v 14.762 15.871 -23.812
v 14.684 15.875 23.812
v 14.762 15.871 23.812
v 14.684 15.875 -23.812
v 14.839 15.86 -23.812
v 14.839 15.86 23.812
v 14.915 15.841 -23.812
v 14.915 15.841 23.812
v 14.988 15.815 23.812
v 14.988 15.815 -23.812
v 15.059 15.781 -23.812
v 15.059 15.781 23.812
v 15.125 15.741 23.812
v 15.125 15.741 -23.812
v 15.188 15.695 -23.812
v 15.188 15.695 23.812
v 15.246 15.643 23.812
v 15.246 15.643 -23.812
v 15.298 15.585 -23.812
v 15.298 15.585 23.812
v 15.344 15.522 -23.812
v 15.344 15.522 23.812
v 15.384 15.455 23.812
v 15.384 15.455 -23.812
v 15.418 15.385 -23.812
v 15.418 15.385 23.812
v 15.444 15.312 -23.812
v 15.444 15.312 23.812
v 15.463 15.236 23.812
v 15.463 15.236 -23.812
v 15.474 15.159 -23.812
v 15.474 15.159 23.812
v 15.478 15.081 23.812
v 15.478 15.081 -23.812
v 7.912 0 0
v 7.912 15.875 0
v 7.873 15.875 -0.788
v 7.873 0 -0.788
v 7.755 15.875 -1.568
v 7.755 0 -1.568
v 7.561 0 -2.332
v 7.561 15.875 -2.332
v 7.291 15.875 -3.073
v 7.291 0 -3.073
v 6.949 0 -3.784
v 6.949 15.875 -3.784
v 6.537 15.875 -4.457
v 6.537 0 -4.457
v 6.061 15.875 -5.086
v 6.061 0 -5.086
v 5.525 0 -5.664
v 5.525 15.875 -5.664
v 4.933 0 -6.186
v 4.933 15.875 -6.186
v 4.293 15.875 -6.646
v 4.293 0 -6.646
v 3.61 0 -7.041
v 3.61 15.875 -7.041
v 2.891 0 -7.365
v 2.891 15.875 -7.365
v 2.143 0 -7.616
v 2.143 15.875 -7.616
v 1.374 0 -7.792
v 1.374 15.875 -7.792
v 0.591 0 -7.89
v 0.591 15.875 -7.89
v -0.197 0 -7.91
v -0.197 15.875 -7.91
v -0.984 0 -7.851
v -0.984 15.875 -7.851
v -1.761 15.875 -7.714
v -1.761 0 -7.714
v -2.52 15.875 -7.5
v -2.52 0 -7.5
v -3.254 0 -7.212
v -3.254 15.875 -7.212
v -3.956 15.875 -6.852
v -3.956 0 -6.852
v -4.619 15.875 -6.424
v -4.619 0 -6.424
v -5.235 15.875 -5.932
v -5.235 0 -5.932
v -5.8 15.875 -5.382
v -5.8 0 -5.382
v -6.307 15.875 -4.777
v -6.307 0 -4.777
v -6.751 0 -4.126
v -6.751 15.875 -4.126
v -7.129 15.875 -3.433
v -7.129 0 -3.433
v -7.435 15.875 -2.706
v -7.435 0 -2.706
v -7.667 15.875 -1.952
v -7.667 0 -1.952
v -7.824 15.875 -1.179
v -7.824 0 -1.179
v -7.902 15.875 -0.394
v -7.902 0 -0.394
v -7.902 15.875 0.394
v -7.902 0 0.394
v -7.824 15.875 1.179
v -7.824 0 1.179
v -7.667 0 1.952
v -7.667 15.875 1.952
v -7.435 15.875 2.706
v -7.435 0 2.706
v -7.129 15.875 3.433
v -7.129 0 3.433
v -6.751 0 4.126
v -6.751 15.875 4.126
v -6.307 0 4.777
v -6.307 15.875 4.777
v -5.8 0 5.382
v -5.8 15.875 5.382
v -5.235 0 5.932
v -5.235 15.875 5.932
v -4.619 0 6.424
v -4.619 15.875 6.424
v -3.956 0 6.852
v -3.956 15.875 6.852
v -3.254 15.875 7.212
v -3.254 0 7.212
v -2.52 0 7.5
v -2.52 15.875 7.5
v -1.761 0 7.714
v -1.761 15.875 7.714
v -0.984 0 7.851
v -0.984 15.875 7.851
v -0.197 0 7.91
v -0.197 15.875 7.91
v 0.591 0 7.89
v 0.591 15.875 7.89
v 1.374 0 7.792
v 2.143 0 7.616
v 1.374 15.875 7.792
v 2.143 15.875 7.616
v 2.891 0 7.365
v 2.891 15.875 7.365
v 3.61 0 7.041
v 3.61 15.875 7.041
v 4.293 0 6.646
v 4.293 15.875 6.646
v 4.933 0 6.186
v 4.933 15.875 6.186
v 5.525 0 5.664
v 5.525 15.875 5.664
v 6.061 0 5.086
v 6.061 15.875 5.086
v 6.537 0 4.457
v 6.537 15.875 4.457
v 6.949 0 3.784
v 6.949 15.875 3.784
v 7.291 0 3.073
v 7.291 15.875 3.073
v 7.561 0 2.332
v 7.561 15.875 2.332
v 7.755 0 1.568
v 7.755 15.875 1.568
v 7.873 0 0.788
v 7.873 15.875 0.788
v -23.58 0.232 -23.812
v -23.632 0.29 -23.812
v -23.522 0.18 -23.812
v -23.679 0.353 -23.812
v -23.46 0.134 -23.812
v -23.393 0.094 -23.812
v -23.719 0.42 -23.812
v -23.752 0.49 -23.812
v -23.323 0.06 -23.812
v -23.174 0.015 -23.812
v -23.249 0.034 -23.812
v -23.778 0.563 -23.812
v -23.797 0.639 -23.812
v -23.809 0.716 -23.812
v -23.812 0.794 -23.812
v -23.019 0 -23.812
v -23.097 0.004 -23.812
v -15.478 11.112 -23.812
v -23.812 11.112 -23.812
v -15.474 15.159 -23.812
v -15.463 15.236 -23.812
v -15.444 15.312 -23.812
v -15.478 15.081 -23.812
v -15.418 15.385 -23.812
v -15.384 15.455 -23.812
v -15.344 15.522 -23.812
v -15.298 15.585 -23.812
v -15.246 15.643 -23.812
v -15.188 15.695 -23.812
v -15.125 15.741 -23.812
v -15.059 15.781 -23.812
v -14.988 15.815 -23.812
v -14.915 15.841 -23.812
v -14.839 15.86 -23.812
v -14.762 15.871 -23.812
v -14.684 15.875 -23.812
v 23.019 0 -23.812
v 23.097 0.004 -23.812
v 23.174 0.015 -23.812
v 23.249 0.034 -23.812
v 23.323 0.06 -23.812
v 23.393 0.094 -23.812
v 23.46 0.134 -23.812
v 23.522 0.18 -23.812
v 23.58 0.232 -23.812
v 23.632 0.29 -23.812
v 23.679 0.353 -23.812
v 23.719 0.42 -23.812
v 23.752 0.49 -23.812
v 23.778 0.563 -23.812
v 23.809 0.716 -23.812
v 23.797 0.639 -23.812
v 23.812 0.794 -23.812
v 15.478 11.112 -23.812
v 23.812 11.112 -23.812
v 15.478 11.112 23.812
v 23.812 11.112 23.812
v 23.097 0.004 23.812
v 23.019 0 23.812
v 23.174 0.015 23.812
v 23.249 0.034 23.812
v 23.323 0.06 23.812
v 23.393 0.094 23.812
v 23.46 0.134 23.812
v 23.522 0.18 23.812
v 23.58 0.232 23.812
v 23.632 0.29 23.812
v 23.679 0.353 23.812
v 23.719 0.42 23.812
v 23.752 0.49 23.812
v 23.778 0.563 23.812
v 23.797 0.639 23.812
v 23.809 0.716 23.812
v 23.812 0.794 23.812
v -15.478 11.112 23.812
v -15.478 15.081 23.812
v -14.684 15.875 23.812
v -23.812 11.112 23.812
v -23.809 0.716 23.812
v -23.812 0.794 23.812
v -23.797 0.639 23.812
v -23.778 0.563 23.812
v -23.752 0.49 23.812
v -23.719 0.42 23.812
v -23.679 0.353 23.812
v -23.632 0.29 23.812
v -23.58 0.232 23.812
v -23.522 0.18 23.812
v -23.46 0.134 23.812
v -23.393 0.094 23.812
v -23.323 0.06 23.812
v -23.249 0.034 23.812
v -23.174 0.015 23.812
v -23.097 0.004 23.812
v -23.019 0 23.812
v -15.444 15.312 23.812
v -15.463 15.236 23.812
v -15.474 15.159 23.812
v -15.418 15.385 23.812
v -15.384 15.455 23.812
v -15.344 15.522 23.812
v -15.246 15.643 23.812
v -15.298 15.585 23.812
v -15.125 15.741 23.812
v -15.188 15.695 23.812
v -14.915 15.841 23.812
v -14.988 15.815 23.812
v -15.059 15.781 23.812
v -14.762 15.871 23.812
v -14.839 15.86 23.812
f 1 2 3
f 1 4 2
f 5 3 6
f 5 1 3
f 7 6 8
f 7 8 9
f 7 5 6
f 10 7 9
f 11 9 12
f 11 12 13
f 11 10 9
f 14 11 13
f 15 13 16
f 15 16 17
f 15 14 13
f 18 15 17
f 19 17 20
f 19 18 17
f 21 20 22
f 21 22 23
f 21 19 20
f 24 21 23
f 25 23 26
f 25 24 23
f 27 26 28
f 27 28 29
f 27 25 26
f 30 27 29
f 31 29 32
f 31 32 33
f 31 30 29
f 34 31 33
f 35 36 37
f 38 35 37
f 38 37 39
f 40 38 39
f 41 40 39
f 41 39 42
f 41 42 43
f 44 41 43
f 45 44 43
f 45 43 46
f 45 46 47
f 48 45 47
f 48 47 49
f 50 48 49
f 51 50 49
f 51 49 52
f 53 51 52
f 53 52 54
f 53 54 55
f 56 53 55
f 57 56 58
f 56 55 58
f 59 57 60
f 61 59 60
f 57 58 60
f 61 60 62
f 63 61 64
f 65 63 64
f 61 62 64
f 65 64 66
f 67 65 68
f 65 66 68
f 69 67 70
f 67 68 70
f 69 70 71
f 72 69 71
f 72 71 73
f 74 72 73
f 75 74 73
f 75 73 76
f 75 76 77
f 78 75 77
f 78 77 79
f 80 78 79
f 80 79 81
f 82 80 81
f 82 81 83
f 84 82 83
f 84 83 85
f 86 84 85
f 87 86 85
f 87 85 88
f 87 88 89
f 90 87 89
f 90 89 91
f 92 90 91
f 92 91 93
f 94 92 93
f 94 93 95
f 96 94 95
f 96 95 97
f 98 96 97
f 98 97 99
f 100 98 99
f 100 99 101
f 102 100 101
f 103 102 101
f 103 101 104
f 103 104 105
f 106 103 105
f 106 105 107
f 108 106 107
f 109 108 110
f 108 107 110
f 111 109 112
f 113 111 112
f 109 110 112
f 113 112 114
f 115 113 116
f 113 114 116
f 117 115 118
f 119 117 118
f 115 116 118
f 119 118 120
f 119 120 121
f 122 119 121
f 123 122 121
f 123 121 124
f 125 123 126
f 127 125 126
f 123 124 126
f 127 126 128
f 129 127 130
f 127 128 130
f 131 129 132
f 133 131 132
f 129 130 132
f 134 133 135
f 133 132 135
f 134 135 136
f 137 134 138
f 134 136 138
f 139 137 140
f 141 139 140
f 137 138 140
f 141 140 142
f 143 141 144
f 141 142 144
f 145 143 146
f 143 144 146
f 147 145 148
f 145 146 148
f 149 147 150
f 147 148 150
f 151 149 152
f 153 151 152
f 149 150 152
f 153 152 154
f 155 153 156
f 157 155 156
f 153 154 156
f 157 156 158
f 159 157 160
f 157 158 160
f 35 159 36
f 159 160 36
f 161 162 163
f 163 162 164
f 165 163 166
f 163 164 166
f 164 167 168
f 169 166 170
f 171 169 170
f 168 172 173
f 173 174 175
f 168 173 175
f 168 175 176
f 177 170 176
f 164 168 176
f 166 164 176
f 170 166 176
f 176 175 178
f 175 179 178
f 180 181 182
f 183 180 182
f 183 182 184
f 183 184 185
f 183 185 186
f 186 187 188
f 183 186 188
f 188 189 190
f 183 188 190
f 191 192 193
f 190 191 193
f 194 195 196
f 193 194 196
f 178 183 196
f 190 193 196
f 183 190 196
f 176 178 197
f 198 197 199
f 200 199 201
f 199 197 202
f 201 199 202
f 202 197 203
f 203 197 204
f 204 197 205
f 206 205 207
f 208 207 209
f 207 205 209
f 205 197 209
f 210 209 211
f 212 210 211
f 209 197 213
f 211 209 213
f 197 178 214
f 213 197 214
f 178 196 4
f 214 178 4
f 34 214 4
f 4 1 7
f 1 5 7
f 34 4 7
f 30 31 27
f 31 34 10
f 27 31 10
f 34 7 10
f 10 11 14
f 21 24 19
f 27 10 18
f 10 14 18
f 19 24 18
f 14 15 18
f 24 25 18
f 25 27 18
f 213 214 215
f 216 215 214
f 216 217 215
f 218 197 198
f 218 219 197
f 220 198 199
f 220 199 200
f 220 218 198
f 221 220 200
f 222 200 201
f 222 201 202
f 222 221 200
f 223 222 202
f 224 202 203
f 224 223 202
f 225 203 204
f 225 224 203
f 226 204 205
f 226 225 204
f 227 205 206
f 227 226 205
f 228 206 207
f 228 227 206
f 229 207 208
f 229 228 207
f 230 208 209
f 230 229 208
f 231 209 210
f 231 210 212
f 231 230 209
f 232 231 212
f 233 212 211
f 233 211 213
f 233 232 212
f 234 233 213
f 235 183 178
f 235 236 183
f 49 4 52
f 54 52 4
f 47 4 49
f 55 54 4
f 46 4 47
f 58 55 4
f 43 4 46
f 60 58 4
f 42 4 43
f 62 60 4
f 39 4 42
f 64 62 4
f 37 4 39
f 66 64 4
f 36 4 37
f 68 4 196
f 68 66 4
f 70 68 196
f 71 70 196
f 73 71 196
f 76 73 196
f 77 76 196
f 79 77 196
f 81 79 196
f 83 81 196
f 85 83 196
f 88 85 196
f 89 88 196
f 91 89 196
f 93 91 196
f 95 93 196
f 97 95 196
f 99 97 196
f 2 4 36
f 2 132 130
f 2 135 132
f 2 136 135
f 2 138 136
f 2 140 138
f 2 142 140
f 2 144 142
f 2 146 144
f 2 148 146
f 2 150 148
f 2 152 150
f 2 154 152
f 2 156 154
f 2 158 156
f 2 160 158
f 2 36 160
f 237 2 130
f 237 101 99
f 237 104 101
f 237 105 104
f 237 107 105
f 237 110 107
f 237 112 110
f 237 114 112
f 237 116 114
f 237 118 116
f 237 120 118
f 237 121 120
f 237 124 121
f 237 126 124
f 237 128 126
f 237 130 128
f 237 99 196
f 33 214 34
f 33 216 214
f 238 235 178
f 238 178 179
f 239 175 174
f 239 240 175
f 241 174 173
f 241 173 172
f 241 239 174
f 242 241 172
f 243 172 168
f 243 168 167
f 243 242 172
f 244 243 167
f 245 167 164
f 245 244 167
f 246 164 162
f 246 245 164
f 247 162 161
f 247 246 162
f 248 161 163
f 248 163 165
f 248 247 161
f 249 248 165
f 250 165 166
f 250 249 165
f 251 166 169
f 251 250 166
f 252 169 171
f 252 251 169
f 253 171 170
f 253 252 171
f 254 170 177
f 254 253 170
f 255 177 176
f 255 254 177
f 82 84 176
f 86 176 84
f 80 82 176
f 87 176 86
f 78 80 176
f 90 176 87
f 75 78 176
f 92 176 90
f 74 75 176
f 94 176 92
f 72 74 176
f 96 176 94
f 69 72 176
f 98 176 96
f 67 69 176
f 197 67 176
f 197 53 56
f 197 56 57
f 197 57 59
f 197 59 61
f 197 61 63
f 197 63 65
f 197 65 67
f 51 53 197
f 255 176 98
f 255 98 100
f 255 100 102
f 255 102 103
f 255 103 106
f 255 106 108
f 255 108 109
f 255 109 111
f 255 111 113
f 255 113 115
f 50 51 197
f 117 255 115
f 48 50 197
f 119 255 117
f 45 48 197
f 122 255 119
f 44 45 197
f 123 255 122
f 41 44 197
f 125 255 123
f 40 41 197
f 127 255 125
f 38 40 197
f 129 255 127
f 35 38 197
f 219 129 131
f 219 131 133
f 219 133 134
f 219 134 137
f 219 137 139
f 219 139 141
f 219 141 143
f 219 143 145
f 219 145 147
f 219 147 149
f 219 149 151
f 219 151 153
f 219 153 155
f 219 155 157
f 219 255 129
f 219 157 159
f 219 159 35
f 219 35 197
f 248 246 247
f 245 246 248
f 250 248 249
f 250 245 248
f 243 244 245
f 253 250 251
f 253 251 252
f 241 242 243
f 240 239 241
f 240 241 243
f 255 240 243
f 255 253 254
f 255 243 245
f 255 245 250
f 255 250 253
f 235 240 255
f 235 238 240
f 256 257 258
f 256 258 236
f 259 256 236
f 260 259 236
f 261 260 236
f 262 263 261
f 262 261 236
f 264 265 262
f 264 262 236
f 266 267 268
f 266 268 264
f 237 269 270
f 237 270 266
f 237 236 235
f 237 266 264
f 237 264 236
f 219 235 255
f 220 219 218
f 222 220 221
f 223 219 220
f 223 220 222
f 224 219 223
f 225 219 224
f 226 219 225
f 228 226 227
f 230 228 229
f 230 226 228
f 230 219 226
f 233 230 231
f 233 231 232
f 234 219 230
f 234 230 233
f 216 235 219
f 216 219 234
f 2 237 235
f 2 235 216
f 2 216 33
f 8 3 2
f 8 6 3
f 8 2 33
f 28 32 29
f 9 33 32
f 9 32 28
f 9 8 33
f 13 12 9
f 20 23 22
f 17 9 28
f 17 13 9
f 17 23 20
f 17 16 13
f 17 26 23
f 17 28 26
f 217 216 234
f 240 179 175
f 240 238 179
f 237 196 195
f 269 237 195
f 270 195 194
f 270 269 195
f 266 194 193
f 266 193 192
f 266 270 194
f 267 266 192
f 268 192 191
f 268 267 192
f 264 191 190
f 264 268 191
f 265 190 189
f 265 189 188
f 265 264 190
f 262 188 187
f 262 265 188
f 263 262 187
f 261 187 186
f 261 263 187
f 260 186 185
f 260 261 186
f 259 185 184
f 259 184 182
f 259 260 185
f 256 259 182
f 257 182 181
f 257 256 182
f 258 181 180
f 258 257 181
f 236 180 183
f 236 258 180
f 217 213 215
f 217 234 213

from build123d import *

# Parameters (mm, degrees)
BOSS_EXTRUDE1_DEPTH = 23.8125
SKETCH2_R           = 7.9121
CUT_EXTRUDE1_DEPTH  = 16.875
FILLET1_R           = 0.79375


with BuildPart() as part:
    # Sketch1 → Boss-Extrude1 (new body, symmetric)
    with BuildSketch(Plane.XY):
        Polygon((15.478125, 15.875), (-15.478125, 15.875), (-15.478125, 11.1125), (-23.8125, 11.1125), (-23.8125, 0), (23.8125, 0), (23.8125, 11.1125), (15.478125, 11.1125), align=None)
    extrude(amount=BOSS_EXTRUDE1_DEPTH, both=True)

    # Sketch2 → Cut-Extrude1 (cut, through all)
    with BuildSketch(Plane(origin=(0, 15.875, 0), x_dir=(1, 0, 0), z_dir=(0, 1, 0))):
        Circle(SKETCH2_R)
    extrude(amount=-CUT_EXTRUDE1_DEPTH, mode=Mode.SUBTRACT)

    # Fillet1
    fillet1_edges = [part.edges().sort_by_distance(p)[0] for p in [
        (-23.8125, 0, 0),
        (-15.478125, 15.875, 0),
        (15.478125, 15.875, 0),
        (23.8125, 0, 0),
    ]]
    fillet(fillet1_edges, radius=FILLET1_R)


solid = part.part
